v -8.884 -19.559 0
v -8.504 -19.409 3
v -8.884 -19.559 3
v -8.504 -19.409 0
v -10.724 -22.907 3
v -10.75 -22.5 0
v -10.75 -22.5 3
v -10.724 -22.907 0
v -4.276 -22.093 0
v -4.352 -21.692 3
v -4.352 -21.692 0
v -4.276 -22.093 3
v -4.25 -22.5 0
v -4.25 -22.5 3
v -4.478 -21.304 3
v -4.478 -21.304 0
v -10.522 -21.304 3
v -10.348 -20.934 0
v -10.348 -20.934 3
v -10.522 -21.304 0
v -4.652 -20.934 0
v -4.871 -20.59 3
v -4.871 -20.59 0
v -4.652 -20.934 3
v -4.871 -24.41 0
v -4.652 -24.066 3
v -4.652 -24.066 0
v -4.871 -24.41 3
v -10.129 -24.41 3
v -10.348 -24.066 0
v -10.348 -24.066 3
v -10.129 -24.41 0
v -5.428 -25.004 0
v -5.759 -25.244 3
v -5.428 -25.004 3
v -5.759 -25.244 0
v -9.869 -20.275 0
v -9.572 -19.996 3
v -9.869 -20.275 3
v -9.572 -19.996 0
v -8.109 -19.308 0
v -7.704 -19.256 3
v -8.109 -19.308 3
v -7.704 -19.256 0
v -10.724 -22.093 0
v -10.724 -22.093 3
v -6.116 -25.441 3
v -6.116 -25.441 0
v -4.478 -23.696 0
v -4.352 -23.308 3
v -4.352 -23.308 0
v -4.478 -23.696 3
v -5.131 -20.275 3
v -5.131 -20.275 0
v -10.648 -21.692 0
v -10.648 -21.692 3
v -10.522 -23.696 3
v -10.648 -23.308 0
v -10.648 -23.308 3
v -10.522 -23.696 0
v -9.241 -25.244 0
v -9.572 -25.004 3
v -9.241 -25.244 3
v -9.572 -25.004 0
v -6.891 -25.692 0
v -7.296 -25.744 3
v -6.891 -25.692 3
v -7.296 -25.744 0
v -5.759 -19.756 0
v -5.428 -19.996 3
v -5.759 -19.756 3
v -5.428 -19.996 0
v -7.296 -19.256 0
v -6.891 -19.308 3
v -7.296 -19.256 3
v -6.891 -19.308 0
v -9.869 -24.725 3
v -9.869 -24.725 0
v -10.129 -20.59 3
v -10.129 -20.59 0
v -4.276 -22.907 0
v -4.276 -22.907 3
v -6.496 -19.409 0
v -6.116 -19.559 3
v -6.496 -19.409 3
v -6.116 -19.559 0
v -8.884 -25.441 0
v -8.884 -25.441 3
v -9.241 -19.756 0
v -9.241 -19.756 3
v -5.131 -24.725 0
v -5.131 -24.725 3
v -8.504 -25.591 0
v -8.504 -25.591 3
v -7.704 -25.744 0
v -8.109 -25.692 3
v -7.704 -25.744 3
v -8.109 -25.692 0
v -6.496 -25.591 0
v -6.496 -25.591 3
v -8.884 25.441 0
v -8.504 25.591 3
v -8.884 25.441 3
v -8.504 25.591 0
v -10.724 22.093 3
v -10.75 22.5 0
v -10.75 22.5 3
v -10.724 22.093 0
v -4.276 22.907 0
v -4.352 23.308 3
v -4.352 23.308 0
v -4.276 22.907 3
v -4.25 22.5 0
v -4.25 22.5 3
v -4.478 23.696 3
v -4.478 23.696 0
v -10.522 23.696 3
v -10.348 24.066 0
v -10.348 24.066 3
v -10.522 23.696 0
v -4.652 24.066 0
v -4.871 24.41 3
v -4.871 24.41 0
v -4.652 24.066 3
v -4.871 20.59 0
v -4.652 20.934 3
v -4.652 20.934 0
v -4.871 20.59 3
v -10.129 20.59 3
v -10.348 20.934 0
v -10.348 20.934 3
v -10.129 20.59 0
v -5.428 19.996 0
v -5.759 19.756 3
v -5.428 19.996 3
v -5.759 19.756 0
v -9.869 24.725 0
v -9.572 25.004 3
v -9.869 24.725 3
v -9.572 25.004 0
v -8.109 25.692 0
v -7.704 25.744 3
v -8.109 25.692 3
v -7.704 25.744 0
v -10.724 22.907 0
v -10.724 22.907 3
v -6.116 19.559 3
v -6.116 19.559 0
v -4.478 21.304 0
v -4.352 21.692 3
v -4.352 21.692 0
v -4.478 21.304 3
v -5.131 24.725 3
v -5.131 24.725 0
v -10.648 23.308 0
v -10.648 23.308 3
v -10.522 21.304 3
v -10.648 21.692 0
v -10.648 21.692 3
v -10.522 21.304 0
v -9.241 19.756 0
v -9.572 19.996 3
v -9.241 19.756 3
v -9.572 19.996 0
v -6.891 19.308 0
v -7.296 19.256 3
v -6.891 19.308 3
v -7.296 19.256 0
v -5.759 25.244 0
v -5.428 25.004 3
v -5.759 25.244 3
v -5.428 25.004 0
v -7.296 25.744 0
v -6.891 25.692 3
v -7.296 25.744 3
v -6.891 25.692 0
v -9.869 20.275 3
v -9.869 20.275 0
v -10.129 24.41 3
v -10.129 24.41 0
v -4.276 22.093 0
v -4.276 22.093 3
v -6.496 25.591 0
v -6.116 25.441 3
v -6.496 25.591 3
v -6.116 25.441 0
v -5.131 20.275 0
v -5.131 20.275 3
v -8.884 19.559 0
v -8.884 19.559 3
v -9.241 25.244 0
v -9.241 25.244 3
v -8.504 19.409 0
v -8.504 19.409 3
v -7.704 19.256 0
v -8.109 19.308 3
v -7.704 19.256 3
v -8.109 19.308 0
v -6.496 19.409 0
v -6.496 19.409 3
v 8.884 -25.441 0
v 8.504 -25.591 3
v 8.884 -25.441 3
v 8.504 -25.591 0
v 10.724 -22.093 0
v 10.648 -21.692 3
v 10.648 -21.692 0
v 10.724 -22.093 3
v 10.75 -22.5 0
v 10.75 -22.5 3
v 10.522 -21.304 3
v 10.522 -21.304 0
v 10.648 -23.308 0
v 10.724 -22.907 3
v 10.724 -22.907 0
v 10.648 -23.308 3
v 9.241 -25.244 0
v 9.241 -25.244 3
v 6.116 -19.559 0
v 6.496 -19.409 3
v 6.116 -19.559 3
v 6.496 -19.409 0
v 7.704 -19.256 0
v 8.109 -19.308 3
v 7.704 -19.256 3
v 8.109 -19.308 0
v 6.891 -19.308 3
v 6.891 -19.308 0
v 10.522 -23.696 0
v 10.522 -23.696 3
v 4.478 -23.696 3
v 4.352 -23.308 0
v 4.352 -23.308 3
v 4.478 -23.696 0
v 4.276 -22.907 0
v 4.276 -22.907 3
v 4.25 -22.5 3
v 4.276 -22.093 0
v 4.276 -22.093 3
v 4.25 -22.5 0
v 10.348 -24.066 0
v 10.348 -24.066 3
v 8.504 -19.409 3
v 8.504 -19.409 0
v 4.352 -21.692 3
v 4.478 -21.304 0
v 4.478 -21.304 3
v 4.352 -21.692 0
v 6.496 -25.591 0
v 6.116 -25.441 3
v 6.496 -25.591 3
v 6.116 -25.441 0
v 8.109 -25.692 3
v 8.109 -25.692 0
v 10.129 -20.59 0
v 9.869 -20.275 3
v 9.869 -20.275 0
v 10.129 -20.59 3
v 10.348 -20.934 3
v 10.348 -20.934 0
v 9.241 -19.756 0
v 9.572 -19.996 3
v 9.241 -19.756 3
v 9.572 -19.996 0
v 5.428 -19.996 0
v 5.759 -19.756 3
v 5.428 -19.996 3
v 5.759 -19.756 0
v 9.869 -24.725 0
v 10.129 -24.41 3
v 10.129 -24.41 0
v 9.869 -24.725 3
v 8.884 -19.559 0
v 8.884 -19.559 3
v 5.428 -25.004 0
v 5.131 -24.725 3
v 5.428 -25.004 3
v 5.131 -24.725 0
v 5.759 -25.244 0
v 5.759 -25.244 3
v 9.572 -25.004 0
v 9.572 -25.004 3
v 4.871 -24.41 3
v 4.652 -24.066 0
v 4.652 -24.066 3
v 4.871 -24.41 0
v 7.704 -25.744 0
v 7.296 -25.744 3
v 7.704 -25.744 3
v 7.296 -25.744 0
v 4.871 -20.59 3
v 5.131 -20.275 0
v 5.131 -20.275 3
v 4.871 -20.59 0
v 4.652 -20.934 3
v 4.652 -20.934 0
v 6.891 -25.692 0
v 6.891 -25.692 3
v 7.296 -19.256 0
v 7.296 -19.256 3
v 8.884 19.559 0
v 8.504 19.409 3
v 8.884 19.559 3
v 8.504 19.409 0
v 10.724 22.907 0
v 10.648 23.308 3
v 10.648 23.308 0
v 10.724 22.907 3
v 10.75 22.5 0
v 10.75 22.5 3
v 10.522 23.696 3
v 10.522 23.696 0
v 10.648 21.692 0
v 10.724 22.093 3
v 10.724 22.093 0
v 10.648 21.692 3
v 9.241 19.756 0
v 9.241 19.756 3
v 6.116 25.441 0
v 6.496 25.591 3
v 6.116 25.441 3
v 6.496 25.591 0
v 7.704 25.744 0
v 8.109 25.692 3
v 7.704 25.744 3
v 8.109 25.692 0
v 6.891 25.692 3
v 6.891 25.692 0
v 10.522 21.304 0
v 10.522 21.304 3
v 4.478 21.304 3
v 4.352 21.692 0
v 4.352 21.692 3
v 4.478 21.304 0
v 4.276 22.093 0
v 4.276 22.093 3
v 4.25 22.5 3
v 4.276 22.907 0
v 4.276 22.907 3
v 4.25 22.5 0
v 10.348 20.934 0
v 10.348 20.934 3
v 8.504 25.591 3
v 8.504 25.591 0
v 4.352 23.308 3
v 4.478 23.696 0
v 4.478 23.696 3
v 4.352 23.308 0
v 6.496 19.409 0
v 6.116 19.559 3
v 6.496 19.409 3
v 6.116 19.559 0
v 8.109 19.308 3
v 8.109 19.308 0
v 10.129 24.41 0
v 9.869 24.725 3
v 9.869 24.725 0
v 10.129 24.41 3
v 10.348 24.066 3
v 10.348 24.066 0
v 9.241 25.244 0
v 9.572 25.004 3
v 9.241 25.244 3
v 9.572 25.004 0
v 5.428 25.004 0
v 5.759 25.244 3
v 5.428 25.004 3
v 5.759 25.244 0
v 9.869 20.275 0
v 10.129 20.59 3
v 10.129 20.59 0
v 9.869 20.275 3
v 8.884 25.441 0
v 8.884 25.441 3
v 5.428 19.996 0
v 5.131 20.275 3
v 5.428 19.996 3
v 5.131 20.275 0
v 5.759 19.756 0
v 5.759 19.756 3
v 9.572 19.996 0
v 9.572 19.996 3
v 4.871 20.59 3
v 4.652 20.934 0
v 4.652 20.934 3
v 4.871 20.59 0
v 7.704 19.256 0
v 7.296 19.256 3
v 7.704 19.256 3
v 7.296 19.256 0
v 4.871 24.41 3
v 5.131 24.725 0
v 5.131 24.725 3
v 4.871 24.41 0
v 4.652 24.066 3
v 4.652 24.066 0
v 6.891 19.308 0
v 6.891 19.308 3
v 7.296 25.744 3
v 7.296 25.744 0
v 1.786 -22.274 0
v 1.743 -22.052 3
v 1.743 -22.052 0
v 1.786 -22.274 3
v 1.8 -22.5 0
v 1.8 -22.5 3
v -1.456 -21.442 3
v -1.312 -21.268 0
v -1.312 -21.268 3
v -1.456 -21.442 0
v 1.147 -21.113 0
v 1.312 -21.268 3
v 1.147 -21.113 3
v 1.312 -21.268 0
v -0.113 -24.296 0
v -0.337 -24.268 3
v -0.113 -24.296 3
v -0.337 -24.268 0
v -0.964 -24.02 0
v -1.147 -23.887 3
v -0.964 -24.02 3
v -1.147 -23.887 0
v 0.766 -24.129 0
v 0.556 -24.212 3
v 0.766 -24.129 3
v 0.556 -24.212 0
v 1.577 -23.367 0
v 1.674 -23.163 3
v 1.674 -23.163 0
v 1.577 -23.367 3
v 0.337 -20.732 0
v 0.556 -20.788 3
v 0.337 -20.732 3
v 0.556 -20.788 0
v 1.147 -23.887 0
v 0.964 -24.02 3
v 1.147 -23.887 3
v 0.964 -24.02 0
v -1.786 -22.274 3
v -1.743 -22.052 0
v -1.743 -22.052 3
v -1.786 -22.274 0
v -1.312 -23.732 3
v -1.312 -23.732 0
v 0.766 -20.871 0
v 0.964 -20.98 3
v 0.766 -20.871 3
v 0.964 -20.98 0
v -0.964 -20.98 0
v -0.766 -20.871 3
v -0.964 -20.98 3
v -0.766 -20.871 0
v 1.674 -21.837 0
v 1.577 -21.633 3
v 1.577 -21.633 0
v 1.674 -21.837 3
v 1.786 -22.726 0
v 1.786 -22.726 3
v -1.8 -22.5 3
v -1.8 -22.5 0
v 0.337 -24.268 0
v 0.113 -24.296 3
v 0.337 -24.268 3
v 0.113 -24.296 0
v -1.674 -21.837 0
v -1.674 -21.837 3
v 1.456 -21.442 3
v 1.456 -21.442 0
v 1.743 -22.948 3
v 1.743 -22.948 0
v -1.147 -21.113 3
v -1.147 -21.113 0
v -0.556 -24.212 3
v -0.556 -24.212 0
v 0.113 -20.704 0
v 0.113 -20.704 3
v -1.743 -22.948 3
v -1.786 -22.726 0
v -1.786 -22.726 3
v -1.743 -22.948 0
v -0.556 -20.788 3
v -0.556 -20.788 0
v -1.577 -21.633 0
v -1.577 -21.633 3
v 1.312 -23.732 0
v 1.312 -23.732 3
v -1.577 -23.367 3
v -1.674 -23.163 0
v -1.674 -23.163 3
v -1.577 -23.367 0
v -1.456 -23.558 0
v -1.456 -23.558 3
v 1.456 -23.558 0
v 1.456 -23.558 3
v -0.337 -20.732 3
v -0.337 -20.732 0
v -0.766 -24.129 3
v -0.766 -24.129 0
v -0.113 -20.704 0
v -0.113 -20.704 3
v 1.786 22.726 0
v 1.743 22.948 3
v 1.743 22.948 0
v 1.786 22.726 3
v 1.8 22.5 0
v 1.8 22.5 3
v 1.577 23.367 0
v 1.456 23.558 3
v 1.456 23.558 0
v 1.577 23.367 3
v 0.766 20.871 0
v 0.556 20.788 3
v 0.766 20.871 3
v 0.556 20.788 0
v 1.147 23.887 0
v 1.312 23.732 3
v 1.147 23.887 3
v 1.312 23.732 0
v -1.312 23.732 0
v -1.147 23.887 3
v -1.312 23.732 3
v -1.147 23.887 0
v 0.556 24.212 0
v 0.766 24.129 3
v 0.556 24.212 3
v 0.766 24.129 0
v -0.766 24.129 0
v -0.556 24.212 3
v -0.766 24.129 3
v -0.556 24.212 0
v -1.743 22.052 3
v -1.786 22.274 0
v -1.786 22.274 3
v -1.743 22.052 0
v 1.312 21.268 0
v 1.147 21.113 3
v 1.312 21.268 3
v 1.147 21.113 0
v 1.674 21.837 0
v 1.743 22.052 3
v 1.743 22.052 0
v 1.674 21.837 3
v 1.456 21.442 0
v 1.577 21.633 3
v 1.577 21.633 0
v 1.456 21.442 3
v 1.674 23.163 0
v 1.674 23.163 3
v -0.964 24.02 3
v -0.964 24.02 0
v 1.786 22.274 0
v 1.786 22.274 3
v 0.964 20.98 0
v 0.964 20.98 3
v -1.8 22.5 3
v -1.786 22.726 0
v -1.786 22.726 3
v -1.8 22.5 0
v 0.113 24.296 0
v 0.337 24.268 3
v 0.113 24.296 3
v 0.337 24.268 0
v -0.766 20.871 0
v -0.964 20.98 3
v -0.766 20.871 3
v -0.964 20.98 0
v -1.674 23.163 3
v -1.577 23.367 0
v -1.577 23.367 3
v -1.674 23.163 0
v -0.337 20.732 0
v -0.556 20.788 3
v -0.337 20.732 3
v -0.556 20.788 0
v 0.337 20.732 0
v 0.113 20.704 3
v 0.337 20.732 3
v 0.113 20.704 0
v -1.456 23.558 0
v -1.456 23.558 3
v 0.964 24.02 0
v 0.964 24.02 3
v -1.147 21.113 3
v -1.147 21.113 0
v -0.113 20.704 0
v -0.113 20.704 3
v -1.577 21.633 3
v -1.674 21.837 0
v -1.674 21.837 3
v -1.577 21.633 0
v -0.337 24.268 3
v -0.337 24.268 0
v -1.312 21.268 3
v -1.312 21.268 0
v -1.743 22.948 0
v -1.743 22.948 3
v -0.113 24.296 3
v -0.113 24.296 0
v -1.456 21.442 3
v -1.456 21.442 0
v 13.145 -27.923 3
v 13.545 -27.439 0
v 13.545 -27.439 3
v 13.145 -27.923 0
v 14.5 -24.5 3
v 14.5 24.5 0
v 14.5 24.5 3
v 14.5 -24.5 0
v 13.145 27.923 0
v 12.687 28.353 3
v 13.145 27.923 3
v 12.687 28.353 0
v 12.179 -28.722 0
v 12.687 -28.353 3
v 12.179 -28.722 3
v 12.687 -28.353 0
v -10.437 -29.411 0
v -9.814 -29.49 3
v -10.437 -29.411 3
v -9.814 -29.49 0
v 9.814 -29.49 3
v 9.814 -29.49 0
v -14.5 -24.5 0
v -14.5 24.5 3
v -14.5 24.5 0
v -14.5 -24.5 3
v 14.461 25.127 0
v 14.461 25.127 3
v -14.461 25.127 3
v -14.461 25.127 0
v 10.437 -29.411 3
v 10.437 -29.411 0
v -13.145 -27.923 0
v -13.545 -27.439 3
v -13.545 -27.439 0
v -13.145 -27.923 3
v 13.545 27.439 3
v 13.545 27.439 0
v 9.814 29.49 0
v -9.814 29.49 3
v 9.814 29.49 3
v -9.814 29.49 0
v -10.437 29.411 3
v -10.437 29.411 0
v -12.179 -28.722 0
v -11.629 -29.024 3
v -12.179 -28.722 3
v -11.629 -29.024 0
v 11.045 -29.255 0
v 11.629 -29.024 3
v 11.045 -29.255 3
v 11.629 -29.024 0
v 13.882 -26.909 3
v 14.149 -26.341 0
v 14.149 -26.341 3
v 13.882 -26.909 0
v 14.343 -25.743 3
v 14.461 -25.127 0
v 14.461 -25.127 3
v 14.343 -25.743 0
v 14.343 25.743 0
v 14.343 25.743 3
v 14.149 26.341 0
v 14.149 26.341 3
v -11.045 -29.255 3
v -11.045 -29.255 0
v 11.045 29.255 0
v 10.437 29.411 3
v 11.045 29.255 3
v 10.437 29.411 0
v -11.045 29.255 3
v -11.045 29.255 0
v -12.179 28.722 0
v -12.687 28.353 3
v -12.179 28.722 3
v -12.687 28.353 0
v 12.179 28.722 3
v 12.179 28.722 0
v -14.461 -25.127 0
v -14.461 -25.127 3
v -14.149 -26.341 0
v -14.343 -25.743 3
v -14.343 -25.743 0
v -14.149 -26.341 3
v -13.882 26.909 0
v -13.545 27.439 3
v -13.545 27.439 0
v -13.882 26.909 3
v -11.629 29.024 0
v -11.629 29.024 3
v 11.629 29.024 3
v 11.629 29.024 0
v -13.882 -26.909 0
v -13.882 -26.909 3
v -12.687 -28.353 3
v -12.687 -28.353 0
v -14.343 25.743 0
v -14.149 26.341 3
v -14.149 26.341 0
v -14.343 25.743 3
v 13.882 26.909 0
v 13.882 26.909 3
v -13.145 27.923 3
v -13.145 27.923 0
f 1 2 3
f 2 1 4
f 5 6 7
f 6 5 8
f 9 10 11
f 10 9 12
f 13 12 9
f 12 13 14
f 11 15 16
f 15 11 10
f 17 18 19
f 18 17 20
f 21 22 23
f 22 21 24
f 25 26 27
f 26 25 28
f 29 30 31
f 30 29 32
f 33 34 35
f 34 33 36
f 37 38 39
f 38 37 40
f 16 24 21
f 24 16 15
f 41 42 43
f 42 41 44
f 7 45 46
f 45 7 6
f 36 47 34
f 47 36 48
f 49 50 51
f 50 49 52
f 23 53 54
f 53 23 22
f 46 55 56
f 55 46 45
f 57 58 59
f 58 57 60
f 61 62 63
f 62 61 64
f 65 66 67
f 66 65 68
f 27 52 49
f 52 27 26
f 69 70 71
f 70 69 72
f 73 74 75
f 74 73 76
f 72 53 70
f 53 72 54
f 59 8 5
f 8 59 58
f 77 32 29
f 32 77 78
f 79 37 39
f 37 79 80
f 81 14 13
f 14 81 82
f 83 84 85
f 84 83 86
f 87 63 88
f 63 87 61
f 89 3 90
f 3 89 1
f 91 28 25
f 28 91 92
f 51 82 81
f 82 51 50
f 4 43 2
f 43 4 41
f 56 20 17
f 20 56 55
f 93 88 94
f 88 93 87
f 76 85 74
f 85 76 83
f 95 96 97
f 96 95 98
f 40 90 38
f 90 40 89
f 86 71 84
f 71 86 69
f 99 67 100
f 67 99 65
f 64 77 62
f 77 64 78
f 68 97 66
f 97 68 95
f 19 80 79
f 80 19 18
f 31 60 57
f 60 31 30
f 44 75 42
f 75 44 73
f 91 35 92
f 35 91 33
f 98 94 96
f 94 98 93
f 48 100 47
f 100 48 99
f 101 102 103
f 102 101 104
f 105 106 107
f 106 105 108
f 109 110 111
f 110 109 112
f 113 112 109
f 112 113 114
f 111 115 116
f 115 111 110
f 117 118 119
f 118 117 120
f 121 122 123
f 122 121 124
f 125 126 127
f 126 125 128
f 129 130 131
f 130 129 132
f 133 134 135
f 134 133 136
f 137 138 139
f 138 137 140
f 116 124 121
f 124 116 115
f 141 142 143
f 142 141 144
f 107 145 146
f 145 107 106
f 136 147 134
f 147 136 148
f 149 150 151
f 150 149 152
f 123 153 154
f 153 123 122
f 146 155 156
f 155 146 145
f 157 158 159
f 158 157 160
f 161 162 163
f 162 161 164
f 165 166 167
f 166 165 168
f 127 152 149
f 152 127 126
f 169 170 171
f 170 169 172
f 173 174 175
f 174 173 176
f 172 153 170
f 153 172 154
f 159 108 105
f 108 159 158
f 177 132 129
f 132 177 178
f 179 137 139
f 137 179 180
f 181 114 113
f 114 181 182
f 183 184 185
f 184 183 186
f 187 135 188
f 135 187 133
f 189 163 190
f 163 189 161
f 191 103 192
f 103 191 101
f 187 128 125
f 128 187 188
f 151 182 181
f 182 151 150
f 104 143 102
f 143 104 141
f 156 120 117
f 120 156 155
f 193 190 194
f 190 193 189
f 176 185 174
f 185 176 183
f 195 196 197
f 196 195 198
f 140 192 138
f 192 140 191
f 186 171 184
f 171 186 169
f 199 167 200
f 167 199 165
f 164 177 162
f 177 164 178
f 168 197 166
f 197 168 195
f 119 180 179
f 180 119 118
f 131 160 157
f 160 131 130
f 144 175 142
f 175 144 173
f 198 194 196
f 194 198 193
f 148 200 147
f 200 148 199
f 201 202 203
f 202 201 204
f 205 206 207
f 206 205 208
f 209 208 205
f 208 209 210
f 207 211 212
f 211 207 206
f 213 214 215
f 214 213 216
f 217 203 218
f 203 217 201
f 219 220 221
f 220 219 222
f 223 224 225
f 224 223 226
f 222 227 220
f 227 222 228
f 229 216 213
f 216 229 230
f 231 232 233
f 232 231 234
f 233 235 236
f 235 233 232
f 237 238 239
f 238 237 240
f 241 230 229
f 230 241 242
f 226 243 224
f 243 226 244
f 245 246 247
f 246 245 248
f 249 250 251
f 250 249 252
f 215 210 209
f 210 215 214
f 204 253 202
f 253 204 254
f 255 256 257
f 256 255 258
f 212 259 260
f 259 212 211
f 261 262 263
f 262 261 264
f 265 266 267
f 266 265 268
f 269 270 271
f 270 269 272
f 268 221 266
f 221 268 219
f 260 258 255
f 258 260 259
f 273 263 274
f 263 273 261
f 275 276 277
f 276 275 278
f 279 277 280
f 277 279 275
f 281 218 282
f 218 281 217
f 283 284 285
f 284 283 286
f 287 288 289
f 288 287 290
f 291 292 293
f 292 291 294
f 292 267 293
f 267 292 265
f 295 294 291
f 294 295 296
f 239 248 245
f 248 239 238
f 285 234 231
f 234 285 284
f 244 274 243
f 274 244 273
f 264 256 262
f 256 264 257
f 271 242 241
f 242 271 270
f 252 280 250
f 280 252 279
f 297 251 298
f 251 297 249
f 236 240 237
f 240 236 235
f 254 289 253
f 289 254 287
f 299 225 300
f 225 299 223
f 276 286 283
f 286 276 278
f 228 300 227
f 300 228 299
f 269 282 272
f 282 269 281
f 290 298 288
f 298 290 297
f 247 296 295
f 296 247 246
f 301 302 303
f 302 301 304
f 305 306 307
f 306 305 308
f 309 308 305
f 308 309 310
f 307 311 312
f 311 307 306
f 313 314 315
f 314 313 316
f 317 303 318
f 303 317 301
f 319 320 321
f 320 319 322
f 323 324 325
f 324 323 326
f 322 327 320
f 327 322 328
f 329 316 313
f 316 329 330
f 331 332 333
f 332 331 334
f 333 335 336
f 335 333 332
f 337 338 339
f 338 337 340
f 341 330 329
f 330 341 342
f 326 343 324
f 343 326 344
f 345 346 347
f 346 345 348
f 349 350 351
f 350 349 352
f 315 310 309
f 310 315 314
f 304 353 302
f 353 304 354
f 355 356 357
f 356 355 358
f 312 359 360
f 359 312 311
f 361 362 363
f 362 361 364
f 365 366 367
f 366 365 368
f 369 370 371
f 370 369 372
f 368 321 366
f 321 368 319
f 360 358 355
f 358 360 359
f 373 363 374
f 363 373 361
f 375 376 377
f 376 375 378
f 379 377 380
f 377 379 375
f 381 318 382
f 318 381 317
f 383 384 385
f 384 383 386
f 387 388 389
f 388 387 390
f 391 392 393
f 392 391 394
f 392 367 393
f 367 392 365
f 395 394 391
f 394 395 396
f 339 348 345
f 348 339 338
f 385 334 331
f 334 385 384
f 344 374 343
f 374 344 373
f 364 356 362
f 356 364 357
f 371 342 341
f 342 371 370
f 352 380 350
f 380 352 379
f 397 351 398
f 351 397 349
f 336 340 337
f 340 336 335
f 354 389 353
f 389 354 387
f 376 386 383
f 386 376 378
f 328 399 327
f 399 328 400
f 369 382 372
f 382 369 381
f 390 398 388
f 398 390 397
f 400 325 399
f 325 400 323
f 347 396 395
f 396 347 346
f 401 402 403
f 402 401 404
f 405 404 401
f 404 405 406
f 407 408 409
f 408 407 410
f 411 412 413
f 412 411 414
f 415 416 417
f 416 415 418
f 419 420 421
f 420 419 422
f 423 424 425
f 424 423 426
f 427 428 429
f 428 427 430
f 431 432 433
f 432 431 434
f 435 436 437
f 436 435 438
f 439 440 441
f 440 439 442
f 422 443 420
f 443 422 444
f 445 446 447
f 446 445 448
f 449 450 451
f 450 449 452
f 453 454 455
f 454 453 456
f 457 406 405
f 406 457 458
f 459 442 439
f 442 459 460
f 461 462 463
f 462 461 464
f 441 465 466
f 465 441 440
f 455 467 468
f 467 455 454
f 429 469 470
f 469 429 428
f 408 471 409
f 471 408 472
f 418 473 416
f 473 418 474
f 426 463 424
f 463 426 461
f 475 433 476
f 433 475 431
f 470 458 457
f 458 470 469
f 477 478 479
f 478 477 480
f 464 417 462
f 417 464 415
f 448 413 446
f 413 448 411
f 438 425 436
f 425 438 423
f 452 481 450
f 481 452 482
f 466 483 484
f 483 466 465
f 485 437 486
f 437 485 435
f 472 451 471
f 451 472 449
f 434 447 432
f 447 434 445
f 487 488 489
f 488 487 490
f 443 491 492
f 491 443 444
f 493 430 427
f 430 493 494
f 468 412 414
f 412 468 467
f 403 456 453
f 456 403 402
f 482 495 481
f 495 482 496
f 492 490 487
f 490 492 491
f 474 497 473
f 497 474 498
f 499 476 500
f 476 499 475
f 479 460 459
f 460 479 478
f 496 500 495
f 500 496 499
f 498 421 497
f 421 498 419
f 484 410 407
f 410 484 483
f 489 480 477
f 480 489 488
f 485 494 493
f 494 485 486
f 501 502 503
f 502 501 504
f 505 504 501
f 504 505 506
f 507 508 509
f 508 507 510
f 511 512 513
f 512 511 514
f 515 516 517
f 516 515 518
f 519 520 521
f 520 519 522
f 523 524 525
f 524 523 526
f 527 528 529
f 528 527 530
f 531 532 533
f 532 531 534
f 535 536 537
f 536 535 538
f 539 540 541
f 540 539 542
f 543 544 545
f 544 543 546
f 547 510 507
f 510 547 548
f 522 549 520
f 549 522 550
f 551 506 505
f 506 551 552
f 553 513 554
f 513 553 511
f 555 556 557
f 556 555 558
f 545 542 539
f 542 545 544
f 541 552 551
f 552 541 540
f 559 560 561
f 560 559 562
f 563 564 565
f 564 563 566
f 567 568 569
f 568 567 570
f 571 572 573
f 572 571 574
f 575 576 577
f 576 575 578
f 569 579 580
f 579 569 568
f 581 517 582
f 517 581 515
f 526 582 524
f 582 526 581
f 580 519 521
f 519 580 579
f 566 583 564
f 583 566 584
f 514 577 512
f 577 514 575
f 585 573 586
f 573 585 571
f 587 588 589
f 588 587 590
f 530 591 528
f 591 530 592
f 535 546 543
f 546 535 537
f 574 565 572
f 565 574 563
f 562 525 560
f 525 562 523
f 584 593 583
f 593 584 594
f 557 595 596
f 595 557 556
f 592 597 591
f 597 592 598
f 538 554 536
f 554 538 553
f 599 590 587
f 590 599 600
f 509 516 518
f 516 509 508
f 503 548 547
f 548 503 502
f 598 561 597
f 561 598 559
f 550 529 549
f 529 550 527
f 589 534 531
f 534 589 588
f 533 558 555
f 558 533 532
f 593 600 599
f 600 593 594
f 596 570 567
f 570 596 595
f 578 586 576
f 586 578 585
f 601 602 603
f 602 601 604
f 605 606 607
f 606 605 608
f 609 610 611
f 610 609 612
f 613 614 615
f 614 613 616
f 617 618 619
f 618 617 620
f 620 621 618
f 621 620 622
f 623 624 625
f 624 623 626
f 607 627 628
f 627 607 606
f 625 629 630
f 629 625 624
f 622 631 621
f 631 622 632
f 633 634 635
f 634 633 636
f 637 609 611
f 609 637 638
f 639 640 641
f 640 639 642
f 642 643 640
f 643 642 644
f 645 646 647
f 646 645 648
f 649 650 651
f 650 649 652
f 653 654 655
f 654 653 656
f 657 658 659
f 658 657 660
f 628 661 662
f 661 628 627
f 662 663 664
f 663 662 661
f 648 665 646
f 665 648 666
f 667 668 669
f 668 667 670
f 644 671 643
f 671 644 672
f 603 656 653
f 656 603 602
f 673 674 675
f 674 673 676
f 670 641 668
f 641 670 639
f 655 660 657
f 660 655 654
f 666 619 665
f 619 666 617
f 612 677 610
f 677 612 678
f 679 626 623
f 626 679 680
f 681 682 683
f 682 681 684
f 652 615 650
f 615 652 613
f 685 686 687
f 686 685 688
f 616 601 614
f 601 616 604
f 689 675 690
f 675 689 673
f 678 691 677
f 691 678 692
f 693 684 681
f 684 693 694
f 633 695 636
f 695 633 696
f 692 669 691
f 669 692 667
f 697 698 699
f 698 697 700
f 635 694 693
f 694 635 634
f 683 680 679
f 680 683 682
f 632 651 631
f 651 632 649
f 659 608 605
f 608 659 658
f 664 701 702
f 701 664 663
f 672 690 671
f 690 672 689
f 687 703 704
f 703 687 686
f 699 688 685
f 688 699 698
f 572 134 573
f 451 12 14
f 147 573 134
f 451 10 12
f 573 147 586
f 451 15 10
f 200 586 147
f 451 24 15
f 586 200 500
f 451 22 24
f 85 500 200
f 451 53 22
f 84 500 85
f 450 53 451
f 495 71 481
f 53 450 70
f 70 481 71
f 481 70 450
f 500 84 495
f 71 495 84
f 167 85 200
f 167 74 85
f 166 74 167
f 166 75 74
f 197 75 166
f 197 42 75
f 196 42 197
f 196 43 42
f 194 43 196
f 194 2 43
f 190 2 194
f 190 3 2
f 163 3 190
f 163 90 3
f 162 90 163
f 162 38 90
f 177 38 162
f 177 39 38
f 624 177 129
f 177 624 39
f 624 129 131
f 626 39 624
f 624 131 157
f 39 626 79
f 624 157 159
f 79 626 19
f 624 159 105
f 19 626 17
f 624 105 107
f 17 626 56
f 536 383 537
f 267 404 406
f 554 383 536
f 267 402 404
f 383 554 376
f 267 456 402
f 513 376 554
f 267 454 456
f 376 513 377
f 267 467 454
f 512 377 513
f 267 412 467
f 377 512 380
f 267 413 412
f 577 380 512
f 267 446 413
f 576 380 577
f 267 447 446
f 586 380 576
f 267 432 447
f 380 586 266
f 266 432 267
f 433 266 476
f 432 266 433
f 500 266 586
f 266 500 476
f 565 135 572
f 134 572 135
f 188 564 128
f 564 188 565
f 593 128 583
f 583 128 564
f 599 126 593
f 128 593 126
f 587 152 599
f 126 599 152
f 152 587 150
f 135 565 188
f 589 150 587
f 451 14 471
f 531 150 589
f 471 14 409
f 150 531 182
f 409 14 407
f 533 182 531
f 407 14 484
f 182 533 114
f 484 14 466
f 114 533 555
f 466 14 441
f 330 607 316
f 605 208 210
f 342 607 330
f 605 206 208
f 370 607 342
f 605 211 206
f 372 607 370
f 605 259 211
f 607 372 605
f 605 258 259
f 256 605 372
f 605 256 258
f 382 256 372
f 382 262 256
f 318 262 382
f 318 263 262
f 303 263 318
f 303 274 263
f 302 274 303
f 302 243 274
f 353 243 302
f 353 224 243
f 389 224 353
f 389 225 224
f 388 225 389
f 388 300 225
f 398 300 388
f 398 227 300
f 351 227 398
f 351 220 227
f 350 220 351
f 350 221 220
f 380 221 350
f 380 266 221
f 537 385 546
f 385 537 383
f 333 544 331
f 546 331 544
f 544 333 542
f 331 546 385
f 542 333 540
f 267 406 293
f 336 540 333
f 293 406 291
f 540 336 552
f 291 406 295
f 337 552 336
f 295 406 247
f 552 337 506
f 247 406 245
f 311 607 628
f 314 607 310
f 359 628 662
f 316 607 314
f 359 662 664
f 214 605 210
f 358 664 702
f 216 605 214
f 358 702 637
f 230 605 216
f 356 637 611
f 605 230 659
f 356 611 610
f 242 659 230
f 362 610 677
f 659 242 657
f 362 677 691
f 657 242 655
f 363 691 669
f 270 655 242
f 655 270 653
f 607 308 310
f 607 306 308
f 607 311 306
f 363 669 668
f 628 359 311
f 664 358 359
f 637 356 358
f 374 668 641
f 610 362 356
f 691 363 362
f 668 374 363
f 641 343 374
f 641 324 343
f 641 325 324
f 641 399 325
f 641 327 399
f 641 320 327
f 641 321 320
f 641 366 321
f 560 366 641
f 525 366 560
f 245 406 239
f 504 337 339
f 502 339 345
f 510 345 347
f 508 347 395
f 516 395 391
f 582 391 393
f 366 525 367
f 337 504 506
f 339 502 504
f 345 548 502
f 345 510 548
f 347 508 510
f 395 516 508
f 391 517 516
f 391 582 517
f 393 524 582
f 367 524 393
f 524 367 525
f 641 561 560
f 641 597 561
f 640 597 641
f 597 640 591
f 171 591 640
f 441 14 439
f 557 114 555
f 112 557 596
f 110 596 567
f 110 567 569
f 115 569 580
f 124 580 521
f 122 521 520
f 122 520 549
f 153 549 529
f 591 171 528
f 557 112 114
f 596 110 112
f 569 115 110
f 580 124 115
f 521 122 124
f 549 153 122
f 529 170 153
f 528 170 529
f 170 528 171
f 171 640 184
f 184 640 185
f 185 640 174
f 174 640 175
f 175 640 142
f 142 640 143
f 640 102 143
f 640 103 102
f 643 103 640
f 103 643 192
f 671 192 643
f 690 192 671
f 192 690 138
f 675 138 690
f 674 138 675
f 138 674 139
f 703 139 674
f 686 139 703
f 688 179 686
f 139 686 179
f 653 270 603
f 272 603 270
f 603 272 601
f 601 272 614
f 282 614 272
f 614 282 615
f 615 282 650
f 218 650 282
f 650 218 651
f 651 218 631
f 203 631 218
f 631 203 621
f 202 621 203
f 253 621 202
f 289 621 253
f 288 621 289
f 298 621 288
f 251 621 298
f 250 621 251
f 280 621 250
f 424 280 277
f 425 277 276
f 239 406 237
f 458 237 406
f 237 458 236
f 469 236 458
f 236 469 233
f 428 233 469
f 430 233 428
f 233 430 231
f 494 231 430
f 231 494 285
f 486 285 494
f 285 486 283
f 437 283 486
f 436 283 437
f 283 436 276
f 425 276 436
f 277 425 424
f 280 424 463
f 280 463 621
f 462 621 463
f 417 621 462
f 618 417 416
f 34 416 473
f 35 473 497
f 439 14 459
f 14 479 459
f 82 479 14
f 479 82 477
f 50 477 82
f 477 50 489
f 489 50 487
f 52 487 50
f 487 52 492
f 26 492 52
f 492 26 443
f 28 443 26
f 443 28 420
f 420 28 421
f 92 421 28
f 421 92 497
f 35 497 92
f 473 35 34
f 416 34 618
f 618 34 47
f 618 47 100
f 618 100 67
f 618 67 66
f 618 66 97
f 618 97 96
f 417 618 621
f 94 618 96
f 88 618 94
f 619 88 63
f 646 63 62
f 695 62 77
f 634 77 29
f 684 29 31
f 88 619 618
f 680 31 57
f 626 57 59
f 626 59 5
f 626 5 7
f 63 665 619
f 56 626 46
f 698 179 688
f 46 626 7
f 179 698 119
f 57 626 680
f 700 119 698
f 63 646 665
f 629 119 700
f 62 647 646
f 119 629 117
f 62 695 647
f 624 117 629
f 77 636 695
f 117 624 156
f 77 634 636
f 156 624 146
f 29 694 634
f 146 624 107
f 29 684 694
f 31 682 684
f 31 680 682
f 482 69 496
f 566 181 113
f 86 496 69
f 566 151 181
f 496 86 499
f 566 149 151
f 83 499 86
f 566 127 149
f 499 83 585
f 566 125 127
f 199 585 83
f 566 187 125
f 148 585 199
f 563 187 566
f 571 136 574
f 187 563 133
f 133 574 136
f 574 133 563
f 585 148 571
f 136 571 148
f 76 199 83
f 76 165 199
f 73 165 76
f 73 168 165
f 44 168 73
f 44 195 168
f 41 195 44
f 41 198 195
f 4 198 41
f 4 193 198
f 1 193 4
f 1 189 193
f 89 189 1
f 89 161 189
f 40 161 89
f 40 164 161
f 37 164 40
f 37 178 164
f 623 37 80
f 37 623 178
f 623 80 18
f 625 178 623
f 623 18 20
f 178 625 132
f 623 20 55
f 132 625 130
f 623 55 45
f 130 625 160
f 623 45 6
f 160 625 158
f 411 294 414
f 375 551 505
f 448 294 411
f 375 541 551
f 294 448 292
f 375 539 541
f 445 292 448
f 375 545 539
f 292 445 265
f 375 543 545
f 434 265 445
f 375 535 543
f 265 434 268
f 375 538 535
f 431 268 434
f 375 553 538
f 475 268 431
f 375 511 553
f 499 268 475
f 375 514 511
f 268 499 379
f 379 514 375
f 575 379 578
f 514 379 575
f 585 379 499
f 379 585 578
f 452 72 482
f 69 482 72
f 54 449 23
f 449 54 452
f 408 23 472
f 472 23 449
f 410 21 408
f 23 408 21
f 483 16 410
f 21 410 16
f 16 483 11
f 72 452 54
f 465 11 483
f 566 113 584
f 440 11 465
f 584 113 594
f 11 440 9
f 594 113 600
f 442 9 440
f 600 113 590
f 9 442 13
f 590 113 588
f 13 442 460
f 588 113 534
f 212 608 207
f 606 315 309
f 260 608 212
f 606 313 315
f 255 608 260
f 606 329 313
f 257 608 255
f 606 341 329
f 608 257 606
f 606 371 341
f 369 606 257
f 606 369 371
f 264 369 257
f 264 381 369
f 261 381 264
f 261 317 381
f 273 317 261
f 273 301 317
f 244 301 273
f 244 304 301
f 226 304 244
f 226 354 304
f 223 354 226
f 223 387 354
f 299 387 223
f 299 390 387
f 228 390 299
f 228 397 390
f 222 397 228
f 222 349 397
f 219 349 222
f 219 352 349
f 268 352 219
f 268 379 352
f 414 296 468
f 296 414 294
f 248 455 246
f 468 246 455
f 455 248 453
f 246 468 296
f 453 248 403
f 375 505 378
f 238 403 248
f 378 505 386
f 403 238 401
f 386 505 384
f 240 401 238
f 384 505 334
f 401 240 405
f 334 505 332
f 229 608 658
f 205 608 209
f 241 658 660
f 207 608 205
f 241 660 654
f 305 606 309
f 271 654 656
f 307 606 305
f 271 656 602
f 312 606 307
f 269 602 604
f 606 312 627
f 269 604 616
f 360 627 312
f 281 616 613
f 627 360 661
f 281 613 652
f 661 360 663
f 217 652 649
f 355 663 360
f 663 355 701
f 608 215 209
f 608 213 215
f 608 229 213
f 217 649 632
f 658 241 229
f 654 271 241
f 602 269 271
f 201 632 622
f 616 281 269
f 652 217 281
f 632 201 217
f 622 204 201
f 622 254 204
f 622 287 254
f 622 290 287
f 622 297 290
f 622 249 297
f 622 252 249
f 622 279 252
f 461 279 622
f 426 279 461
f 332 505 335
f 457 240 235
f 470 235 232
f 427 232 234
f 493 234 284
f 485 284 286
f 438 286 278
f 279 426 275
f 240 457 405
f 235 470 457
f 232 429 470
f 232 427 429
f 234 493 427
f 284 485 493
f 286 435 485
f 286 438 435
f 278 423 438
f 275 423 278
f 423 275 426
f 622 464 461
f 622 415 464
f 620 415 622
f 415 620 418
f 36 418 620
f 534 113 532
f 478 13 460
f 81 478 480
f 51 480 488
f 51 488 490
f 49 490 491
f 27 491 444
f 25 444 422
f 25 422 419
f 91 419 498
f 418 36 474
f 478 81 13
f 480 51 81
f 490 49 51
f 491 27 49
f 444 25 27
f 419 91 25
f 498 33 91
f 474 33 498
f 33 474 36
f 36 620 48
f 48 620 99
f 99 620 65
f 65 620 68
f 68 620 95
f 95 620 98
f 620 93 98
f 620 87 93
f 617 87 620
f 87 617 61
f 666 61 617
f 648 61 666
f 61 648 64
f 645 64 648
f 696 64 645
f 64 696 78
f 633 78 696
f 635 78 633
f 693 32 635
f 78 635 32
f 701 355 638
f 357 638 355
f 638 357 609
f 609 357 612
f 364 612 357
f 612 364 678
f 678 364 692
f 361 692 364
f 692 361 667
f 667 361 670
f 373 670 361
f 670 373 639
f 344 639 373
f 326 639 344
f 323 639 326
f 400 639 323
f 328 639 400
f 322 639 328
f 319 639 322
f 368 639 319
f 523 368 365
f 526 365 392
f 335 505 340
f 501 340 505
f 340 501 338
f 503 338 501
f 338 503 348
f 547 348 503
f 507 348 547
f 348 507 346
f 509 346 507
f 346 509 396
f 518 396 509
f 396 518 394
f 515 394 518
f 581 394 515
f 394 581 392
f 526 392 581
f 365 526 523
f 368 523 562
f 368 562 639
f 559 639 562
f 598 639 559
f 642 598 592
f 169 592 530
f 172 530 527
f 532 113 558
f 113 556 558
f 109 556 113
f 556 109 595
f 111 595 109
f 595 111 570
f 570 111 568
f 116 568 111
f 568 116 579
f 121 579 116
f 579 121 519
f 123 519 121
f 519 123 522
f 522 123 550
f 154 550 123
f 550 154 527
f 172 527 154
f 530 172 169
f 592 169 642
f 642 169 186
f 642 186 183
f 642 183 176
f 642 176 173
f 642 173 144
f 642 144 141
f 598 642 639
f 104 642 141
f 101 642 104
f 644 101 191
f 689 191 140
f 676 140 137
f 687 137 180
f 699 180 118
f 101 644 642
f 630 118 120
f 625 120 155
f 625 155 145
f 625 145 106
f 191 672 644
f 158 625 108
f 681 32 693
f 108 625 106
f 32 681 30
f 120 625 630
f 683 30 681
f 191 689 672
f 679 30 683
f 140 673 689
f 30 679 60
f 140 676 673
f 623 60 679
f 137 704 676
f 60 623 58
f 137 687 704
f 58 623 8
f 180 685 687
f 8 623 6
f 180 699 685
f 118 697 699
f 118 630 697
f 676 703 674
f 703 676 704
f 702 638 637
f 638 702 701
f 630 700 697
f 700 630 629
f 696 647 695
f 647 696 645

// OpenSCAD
$fn = 50;

difference() {
	union() {
		hull() {
			translate(v = [-9.5, 24.5, 0]) {
				cylinder(h = 3, r = 5);
			}
			translate(v = [9.5, 24.5, 0]) {
				cylinder(h = 3, r = 5);
			}
			translate(v = [-9.5, -24.5, 0]) {
				cylinder(h = 3, r = 5);
			}
			translate(v = [9.5, -24.5, 0]) {
				cylinder(h = 3, r = 5);
			}
		}
	}
	union() {
		translate(v = [-7.5, -22.5, -1]) {
			cylinder(h = 5, r = 3.25);
		}
		translate(v = [-7.5, 22.5, -1]) {
			cylinder(h = 5, r = 3.25);
		}
		translate(v = [7.5, -22.5, -1]) {
			cylinder(h = 5, r = 3.25);
		}
		translate(v = [7.5, 22.5, -1]) {
			cylinder(h = 5, r = 3.25);
		}
		translate(v = [0.0, -22.5, -1]) {
			cylinder(h = 5, r = 1.8);
		}
		translate(v = [0.0, 22.5, -1]) {
			cylinder(h = 5, r = 1.8);
		}
	}
}
